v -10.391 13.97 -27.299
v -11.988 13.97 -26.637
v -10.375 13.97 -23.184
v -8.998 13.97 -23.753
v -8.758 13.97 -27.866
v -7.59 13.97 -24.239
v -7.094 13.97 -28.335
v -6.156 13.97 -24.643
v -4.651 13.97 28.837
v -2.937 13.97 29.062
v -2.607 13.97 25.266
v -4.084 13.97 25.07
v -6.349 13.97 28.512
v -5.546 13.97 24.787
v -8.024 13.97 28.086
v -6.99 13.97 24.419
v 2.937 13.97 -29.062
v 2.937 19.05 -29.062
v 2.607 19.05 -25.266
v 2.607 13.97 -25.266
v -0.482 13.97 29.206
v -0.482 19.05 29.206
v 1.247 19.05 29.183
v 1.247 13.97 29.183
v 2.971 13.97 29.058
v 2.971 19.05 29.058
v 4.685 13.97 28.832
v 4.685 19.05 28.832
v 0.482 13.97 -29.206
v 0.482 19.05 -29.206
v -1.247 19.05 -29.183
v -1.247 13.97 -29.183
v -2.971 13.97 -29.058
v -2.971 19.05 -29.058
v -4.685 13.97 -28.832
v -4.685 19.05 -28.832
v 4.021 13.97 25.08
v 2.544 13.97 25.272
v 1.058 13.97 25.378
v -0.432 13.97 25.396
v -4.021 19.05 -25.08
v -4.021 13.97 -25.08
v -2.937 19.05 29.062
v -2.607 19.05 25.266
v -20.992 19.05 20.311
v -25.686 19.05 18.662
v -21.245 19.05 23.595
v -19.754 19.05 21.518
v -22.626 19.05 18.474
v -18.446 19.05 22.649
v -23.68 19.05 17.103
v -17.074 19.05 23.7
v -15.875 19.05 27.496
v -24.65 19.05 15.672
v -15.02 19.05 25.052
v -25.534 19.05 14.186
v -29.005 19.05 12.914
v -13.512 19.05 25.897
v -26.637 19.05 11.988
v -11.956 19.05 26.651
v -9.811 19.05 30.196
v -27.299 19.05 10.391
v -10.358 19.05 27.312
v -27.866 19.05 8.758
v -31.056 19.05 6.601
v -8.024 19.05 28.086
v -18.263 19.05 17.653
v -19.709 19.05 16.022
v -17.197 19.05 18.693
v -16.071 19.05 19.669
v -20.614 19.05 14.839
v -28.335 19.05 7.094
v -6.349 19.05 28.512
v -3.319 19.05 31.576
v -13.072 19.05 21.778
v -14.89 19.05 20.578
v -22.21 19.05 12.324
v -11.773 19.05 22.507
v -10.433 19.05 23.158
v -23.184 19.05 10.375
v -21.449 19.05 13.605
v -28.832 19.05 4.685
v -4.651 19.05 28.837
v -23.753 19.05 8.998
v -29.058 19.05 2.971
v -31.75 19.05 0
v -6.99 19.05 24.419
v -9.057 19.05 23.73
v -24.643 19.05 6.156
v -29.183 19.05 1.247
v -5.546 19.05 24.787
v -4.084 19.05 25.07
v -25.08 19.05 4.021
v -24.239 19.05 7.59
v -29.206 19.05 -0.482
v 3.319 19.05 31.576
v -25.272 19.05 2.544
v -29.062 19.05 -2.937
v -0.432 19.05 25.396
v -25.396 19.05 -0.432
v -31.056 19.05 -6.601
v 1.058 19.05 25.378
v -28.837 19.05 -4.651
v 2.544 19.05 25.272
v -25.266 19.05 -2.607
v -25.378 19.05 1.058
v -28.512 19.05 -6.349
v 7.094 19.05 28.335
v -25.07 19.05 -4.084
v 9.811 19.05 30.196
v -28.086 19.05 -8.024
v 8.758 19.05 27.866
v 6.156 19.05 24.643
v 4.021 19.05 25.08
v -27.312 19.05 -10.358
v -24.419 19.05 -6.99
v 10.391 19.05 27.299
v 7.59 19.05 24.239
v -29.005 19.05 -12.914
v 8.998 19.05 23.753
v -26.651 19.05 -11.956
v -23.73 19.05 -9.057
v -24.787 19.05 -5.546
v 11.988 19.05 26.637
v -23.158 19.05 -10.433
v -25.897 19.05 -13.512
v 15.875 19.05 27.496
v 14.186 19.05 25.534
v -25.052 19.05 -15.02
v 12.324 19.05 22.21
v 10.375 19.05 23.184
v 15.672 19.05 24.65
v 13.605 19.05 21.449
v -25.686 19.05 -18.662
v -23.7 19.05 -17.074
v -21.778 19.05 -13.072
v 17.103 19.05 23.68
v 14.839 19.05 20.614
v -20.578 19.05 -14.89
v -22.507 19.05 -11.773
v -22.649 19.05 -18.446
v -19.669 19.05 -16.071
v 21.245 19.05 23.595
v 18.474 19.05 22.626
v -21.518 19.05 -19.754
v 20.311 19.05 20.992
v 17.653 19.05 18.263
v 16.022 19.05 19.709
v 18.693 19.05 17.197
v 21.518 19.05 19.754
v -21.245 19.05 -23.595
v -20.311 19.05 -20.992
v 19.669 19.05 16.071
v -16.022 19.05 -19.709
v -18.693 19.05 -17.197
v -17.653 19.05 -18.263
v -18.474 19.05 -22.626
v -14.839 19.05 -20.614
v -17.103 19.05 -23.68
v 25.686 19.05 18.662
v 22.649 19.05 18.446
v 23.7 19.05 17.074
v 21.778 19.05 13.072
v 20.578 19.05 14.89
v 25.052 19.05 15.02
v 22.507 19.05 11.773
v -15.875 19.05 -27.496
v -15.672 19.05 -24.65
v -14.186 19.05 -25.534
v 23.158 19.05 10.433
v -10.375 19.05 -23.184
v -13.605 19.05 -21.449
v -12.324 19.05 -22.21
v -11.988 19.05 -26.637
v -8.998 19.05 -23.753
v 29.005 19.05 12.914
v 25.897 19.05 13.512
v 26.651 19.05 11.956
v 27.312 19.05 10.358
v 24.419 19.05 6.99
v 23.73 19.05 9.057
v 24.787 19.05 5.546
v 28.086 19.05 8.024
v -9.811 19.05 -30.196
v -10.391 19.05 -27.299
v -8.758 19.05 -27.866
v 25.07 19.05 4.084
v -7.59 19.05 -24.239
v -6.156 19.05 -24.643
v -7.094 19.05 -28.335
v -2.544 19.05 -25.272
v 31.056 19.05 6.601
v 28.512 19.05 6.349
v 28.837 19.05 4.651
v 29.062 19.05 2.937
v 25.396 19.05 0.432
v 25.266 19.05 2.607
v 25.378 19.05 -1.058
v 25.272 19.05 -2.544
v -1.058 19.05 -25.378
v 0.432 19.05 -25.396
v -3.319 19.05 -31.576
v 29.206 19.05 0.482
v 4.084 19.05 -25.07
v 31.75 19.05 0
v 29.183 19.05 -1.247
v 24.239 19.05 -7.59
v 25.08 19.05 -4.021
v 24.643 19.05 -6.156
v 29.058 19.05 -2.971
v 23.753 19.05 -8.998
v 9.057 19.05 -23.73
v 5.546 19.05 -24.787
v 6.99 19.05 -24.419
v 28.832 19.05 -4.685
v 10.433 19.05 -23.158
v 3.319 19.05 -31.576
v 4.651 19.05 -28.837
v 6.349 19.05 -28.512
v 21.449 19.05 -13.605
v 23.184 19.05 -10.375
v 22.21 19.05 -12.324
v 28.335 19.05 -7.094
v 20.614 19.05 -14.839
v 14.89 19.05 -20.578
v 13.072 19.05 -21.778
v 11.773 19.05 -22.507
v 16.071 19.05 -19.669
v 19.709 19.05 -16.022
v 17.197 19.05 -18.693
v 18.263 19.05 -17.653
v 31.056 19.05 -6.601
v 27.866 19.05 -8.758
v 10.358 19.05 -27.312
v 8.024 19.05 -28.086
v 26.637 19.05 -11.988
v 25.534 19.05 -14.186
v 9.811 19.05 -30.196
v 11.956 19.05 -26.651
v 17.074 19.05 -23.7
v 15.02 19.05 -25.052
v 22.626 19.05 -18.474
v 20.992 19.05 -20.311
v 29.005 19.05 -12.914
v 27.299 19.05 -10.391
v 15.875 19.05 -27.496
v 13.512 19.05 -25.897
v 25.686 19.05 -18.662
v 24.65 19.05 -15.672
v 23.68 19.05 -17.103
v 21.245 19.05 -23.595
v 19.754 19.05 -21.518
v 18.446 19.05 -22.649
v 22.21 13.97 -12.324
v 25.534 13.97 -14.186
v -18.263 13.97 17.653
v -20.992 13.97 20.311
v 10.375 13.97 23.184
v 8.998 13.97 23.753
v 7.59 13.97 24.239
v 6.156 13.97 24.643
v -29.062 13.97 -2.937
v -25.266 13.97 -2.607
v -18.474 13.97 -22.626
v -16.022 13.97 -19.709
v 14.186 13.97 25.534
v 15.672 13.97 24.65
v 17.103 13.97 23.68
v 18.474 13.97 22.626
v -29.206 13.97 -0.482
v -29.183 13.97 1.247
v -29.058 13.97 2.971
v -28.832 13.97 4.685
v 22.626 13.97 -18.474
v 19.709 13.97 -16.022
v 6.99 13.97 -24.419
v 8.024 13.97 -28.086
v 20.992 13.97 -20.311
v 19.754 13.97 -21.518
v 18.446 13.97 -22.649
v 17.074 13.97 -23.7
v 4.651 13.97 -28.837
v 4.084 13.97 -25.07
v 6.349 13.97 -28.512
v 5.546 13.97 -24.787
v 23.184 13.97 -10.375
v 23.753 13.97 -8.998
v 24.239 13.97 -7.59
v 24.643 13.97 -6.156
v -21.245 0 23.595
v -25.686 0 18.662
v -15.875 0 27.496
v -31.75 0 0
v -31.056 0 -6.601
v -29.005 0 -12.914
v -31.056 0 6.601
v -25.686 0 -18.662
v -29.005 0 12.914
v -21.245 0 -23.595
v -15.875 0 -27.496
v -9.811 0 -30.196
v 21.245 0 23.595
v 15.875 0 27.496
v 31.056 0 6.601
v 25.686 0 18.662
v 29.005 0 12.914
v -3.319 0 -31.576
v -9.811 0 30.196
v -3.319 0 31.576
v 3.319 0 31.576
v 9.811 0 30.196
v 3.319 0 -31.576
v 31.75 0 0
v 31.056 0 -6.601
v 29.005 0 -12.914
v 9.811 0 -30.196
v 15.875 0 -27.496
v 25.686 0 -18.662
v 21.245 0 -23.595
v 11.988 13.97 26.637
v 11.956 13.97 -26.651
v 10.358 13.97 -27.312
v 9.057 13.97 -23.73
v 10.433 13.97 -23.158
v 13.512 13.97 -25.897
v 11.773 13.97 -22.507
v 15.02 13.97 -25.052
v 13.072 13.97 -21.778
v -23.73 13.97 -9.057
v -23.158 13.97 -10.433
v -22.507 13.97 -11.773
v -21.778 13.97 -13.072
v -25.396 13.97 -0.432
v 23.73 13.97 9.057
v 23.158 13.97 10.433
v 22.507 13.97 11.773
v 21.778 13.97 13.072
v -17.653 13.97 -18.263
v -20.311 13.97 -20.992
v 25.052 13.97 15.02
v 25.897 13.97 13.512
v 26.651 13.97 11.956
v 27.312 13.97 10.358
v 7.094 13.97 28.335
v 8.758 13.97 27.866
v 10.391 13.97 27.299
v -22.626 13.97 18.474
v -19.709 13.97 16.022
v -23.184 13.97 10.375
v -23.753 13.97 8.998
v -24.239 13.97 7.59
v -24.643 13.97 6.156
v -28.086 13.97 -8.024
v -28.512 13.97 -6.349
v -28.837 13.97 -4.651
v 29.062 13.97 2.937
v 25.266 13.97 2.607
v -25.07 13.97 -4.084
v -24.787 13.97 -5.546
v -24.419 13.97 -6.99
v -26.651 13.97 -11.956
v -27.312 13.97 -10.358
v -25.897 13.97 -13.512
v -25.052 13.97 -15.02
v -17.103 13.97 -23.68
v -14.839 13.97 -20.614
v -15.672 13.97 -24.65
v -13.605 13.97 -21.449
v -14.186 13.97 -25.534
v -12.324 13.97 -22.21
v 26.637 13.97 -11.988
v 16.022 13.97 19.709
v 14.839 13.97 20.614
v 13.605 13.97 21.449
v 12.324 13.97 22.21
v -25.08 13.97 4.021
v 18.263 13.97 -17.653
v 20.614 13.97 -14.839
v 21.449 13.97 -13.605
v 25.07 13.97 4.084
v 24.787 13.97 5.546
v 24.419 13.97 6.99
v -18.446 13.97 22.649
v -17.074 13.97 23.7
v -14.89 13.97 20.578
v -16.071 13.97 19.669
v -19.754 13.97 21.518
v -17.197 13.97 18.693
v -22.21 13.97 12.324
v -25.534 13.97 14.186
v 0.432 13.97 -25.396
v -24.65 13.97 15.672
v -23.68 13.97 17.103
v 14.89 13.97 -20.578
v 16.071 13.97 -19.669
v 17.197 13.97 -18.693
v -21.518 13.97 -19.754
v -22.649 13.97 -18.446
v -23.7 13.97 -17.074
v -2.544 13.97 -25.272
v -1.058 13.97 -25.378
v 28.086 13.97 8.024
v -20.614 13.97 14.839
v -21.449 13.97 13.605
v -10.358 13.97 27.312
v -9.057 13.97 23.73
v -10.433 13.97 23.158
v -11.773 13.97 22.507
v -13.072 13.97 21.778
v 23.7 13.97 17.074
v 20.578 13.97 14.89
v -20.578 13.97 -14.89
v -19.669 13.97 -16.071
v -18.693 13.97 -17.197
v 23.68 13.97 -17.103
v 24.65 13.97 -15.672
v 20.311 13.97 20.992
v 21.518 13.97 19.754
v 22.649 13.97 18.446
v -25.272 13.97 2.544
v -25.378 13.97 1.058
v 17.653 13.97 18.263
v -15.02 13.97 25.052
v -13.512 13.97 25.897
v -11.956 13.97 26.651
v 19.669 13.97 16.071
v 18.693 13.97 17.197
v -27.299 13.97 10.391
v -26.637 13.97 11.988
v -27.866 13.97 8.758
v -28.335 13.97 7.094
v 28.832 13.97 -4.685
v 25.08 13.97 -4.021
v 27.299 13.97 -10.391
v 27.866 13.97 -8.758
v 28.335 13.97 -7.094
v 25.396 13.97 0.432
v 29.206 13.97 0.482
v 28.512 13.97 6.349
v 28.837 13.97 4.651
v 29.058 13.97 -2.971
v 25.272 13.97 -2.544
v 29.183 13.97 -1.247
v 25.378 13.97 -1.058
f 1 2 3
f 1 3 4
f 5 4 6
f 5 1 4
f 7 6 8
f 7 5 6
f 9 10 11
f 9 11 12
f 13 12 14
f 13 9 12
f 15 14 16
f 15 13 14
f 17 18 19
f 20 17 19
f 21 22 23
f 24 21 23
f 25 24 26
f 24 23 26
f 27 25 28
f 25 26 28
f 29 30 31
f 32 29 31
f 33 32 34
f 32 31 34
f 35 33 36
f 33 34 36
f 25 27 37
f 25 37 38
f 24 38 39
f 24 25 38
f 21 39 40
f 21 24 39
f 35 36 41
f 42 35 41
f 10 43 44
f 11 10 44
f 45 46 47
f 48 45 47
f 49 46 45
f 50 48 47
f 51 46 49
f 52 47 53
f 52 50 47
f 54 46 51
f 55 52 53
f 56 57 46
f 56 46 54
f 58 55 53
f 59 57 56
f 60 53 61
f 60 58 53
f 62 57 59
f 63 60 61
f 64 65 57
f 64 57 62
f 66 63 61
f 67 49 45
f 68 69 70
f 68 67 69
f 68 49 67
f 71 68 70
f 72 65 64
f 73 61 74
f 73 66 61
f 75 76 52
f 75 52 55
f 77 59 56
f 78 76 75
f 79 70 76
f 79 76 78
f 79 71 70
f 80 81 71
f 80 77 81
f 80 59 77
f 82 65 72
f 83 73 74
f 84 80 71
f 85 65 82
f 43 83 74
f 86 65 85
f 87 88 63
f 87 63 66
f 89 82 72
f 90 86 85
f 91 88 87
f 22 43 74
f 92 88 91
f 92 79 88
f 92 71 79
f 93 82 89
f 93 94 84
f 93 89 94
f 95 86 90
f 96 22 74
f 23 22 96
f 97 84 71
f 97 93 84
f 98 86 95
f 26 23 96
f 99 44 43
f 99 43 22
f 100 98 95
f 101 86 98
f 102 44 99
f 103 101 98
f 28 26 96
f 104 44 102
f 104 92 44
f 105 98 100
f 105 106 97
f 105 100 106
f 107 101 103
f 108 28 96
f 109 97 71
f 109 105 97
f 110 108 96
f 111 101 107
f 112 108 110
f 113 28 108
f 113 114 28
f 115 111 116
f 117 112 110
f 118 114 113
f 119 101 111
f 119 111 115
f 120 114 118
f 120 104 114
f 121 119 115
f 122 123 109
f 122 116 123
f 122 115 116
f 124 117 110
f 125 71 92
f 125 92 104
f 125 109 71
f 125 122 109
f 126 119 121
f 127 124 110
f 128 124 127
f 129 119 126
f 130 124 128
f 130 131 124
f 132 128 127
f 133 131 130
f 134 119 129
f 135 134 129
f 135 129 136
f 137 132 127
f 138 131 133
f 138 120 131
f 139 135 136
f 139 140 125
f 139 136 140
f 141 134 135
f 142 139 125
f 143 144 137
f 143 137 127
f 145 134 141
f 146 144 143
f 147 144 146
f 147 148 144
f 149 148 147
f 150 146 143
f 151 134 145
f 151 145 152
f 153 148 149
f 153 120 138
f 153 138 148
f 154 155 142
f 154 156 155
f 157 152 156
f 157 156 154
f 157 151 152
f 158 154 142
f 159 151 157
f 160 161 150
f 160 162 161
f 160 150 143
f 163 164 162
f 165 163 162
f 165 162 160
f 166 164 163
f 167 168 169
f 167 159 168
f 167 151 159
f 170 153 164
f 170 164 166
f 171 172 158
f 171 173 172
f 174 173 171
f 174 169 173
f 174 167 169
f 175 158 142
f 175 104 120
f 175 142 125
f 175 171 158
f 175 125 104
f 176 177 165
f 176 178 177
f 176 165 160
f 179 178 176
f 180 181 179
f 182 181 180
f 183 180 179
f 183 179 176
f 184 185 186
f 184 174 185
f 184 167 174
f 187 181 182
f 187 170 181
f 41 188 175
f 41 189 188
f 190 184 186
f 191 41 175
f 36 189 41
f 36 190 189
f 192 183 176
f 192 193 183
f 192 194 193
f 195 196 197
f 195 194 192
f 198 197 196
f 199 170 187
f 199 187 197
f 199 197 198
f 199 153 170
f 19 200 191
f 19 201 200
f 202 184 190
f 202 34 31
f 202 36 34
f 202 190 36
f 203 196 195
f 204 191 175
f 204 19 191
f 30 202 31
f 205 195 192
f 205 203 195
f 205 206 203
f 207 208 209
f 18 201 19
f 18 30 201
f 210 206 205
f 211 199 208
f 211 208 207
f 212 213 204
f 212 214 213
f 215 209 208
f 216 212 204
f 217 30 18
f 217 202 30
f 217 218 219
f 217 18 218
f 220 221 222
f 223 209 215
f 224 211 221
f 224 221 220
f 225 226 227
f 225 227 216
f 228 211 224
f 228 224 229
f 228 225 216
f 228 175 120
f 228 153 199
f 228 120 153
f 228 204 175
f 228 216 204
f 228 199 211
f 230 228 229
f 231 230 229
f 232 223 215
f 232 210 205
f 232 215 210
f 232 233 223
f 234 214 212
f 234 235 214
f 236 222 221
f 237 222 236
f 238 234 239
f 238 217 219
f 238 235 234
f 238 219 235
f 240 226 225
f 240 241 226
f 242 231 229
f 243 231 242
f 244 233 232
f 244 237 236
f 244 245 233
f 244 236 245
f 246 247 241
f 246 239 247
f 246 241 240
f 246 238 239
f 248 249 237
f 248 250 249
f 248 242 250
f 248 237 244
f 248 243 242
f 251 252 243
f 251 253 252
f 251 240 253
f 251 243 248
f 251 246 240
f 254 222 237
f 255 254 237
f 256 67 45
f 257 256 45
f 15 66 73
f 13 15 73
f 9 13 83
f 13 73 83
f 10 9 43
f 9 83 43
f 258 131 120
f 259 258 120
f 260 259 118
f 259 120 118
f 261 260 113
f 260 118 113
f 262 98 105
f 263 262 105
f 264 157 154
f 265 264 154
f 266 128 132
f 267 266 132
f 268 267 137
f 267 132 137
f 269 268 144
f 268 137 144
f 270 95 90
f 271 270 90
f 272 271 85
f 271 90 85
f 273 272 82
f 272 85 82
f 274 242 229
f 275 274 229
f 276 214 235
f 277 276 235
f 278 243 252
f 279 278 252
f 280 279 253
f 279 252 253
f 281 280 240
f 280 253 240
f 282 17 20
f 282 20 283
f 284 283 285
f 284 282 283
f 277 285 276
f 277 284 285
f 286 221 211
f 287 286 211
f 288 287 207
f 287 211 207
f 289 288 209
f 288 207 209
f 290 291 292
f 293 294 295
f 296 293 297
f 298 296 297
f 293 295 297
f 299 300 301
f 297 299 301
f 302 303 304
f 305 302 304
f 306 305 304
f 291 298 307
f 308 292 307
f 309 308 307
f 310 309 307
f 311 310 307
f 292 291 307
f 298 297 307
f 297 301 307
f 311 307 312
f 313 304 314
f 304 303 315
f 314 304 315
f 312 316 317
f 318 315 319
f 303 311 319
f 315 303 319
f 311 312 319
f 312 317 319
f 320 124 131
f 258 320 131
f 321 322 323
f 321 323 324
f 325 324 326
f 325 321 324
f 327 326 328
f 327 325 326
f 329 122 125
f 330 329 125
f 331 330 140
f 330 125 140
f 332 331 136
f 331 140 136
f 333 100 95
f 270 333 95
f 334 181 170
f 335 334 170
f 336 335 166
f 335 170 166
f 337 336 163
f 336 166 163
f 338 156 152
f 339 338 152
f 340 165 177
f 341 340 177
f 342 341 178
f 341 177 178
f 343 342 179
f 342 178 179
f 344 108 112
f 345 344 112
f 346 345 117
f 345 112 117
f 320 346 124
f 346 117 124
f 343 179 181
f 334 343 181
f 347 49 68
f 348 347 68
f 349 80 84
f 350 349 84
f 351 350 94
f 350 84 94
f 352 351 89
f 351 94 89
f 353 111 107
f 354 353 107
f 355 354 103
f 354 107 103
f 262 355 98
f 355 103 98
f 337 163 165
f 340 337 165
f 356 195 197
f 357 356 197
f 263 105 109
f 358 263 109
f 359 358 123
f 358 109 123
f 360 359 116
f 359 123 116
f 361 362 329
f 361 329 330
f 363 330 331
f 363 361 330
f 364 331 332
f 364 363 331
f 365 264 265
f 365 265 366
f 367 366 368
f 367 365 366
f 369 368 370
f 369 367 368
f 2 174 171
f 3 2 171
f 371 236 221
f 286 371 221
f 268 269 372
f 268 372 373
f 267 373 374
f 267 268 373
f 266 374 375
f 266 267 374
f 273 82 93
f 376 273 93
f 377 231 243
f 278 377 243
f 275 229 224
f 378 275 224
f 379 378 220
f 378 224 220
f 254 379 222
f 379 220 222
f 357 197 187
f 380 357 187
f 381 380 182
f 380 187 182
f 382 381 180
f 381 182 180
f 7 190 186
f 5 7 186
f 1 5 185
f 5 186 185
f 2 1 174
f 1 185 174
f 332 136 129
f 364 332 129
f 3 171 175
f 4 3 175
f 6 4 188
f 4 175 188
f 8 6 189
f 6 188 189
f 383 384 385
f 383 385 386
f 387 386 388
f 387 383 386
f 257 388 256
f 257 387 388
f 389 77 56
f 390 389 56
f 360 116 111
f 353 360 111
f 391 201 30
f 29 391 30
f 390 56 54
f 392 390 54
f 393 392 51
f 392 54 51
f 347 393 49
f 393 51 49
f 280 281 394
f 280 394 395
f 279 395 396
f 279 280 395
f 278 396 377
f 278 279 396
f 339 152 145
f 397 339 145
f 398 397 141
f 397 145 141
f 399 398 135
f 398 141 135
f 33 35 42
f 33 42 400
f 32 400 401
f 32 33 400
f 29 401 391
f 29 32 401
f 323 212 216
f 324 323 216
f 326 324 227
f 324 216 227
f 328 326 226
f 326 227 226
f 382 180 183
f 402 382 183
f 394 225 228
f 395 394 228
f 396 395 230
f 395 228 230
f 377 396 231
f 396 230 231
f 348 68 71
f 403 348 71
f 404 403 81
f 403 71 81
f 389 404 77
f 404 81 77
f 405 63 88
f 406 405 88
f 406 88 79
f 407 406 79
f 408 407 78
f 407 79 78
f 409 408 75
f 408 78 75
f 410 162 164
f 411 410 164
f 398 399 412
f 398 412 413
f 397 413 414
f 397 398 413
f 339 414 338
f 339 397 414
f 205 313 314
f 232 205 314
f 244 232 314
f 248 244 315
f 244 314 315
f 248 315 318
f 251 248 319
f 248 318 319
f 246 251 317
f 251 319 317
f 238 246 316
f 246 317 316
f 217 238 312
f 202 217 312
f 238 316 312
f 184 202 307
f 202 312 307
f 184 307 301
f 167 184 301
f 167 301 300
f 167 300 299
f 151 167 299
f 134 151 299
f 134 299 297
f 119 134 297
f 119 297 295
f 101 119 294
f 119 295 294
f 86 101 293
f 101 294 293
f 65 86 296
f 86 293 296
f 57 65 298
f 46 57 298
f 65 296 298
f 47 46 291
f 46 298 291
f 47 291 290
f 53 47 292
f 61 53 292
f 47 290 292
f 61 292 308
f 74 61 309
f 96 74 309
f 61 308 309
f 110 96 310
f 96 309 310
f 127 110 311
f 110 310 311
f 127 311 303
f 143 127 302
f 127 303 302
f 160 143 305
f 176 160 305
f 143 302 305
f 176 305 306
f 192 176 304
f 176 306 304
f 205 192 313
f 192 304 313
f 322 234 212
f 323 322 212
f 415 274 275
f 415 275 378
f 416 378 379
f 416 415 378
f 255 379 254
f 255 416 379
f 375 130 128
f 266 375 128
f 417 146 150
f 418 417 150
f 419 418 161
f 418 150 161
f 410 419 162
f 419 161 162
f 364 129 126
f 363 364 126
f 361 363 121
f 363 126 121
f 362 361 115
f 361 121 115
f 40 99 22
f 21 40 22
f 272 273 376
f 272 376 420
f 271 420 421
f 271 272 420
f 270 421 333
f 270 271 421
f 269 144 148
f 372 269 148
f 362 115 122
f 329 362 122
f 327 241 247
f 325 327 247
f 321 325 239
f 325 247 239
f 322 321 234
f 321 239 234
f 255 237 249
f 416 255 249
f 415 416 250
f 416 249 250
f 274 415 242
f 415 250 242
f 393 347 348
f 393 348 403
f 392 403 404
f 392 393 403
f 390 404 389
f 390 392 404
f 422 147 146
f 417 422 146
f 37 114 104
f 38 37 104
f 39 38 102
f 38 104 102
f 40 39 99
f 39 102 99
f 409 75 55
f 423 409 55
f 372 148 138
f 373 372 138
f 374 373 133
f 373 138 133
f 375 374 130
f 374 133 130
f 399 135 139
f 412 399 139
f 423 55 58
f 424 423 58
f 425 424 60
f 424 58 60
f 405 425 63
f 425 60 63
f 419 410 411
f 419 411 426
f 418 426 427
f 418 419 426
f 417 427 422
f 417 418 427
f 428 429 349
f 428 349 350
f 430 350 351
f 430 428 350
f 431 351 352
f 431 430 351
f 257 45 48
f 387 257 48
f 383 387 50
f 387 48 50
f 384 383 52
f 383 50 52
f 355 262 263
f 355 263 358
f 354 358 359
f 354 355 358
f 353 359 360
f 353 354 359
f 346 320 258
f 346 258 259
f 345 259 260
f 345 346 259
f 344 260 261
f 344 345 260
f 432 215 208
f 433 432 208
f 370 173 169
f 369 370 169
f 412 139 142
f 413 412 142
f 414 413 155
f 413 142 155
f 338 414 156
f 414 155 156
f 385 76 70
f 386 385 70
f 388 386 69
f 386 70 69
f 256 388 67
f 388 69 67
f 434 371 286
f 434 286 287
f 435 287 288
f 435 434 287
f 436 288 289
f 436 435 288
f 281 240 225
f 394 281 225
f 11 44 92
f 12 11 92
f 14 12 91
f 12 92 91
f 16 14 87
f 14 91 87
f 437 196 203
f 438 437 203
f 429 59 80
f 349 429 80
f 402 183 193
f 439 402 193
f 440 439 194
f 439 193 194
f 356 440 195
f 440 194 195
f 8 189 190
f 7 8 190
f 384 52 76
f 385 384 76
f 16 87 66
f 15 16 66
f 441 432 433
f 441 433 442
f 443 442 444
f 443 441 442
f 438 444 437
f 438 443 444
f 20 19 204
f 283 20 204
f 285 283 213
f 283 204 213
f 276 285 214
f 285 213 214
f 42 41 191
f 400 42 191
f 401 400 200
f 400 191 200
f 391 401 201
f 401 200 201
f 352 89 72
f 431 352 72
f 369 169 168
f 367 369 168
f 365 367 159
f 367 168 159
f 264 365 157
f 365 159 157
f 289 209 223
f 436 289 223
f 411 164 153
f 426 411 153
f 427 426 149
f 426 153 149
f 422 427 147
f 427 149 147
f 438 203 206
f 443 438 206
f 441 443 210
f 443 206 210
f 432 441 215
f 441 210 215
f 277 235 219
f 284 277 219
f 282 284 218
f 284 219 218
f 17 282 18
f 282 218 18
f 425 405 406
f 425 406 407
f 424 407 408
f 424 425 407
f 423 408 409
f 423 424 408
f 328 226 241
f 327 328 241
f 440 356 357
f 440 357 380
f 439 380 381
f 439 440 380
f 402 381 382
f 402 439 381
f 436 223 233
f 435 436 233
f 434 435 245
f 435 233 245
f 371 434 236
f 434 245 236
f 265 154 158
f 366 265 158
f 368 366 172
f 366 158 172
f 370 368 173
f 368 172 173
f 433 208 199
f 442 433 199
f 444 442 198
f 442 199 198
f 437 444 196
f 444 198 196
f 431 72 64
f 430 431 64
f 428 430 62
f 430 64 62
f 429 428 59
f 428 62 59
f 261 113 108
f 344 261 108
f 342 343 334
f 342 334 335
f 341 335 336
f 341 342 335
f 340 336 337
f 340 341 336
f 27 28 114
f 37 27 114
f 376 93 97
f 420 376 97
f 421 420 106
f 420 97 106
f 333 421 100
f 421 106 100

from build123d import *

# Parameters (mm, degrees)
SKETCH1_R           = 31.75
BOSS_EXTRUDE1_DEPTH = 19.05
CUT_EXTRUDE1_DEPTH  = 5.08
CIRPATTERN1_COUNT   = 24


with BuildPart() as part:
    # Sketch1 → Boss-Extrude1 (new body)
    with BuildSketch(Plane(origin=(0, 0, 0), x_dir=(1, 0, 0), z_dir=(0, 1, 0))):
        Circle(SKETCH1_R)
    extrude(amount=BOSS_EXTRUDE1_DEPTH)

    # Sketch2 → Cut-Extrude1 (cut)
    with BuildSketch(Plane(origin=(0, 19.05, 0), x_dir=(1, 0, 0), z_dir=(0, 1, 0))):
        with BuildLine():
            Line((0.431861346, 25.396328392), (0.481566937, 29.206030084))
            ThreePointArc((0.481566937, 29.206030084), (-2.110193645, 29.133677811), (-4.685328245, 28.831784531))
            Line((-4.685328245, 28.831784531), (-4.021364533, 25.079645677))
            ThreePointArc((-4.021364533, 25.079645677), (-1.801722861, 25.336017736), (0.431861346, 25.396328392))
        make_face()
    cut_extrude1 = extrude(amount=-CUT_EXTRUDE1_DEPTH, mode=Mode.SUBTRACT)

    # CirPattern1: Cut-Extrude1 ×24 about axis
    cirpattern1_axis = Axis((0, 0, 0), (0, 1, 0))
    for i in range(1, CIRPATTERN1_COUNT):
        add(cut_extrude1.rotate(cirpattern1_axis, i * 360 / CIRPATTERN1_COUNT), mode=Mode.SUBTRACT)


solid = part.part
